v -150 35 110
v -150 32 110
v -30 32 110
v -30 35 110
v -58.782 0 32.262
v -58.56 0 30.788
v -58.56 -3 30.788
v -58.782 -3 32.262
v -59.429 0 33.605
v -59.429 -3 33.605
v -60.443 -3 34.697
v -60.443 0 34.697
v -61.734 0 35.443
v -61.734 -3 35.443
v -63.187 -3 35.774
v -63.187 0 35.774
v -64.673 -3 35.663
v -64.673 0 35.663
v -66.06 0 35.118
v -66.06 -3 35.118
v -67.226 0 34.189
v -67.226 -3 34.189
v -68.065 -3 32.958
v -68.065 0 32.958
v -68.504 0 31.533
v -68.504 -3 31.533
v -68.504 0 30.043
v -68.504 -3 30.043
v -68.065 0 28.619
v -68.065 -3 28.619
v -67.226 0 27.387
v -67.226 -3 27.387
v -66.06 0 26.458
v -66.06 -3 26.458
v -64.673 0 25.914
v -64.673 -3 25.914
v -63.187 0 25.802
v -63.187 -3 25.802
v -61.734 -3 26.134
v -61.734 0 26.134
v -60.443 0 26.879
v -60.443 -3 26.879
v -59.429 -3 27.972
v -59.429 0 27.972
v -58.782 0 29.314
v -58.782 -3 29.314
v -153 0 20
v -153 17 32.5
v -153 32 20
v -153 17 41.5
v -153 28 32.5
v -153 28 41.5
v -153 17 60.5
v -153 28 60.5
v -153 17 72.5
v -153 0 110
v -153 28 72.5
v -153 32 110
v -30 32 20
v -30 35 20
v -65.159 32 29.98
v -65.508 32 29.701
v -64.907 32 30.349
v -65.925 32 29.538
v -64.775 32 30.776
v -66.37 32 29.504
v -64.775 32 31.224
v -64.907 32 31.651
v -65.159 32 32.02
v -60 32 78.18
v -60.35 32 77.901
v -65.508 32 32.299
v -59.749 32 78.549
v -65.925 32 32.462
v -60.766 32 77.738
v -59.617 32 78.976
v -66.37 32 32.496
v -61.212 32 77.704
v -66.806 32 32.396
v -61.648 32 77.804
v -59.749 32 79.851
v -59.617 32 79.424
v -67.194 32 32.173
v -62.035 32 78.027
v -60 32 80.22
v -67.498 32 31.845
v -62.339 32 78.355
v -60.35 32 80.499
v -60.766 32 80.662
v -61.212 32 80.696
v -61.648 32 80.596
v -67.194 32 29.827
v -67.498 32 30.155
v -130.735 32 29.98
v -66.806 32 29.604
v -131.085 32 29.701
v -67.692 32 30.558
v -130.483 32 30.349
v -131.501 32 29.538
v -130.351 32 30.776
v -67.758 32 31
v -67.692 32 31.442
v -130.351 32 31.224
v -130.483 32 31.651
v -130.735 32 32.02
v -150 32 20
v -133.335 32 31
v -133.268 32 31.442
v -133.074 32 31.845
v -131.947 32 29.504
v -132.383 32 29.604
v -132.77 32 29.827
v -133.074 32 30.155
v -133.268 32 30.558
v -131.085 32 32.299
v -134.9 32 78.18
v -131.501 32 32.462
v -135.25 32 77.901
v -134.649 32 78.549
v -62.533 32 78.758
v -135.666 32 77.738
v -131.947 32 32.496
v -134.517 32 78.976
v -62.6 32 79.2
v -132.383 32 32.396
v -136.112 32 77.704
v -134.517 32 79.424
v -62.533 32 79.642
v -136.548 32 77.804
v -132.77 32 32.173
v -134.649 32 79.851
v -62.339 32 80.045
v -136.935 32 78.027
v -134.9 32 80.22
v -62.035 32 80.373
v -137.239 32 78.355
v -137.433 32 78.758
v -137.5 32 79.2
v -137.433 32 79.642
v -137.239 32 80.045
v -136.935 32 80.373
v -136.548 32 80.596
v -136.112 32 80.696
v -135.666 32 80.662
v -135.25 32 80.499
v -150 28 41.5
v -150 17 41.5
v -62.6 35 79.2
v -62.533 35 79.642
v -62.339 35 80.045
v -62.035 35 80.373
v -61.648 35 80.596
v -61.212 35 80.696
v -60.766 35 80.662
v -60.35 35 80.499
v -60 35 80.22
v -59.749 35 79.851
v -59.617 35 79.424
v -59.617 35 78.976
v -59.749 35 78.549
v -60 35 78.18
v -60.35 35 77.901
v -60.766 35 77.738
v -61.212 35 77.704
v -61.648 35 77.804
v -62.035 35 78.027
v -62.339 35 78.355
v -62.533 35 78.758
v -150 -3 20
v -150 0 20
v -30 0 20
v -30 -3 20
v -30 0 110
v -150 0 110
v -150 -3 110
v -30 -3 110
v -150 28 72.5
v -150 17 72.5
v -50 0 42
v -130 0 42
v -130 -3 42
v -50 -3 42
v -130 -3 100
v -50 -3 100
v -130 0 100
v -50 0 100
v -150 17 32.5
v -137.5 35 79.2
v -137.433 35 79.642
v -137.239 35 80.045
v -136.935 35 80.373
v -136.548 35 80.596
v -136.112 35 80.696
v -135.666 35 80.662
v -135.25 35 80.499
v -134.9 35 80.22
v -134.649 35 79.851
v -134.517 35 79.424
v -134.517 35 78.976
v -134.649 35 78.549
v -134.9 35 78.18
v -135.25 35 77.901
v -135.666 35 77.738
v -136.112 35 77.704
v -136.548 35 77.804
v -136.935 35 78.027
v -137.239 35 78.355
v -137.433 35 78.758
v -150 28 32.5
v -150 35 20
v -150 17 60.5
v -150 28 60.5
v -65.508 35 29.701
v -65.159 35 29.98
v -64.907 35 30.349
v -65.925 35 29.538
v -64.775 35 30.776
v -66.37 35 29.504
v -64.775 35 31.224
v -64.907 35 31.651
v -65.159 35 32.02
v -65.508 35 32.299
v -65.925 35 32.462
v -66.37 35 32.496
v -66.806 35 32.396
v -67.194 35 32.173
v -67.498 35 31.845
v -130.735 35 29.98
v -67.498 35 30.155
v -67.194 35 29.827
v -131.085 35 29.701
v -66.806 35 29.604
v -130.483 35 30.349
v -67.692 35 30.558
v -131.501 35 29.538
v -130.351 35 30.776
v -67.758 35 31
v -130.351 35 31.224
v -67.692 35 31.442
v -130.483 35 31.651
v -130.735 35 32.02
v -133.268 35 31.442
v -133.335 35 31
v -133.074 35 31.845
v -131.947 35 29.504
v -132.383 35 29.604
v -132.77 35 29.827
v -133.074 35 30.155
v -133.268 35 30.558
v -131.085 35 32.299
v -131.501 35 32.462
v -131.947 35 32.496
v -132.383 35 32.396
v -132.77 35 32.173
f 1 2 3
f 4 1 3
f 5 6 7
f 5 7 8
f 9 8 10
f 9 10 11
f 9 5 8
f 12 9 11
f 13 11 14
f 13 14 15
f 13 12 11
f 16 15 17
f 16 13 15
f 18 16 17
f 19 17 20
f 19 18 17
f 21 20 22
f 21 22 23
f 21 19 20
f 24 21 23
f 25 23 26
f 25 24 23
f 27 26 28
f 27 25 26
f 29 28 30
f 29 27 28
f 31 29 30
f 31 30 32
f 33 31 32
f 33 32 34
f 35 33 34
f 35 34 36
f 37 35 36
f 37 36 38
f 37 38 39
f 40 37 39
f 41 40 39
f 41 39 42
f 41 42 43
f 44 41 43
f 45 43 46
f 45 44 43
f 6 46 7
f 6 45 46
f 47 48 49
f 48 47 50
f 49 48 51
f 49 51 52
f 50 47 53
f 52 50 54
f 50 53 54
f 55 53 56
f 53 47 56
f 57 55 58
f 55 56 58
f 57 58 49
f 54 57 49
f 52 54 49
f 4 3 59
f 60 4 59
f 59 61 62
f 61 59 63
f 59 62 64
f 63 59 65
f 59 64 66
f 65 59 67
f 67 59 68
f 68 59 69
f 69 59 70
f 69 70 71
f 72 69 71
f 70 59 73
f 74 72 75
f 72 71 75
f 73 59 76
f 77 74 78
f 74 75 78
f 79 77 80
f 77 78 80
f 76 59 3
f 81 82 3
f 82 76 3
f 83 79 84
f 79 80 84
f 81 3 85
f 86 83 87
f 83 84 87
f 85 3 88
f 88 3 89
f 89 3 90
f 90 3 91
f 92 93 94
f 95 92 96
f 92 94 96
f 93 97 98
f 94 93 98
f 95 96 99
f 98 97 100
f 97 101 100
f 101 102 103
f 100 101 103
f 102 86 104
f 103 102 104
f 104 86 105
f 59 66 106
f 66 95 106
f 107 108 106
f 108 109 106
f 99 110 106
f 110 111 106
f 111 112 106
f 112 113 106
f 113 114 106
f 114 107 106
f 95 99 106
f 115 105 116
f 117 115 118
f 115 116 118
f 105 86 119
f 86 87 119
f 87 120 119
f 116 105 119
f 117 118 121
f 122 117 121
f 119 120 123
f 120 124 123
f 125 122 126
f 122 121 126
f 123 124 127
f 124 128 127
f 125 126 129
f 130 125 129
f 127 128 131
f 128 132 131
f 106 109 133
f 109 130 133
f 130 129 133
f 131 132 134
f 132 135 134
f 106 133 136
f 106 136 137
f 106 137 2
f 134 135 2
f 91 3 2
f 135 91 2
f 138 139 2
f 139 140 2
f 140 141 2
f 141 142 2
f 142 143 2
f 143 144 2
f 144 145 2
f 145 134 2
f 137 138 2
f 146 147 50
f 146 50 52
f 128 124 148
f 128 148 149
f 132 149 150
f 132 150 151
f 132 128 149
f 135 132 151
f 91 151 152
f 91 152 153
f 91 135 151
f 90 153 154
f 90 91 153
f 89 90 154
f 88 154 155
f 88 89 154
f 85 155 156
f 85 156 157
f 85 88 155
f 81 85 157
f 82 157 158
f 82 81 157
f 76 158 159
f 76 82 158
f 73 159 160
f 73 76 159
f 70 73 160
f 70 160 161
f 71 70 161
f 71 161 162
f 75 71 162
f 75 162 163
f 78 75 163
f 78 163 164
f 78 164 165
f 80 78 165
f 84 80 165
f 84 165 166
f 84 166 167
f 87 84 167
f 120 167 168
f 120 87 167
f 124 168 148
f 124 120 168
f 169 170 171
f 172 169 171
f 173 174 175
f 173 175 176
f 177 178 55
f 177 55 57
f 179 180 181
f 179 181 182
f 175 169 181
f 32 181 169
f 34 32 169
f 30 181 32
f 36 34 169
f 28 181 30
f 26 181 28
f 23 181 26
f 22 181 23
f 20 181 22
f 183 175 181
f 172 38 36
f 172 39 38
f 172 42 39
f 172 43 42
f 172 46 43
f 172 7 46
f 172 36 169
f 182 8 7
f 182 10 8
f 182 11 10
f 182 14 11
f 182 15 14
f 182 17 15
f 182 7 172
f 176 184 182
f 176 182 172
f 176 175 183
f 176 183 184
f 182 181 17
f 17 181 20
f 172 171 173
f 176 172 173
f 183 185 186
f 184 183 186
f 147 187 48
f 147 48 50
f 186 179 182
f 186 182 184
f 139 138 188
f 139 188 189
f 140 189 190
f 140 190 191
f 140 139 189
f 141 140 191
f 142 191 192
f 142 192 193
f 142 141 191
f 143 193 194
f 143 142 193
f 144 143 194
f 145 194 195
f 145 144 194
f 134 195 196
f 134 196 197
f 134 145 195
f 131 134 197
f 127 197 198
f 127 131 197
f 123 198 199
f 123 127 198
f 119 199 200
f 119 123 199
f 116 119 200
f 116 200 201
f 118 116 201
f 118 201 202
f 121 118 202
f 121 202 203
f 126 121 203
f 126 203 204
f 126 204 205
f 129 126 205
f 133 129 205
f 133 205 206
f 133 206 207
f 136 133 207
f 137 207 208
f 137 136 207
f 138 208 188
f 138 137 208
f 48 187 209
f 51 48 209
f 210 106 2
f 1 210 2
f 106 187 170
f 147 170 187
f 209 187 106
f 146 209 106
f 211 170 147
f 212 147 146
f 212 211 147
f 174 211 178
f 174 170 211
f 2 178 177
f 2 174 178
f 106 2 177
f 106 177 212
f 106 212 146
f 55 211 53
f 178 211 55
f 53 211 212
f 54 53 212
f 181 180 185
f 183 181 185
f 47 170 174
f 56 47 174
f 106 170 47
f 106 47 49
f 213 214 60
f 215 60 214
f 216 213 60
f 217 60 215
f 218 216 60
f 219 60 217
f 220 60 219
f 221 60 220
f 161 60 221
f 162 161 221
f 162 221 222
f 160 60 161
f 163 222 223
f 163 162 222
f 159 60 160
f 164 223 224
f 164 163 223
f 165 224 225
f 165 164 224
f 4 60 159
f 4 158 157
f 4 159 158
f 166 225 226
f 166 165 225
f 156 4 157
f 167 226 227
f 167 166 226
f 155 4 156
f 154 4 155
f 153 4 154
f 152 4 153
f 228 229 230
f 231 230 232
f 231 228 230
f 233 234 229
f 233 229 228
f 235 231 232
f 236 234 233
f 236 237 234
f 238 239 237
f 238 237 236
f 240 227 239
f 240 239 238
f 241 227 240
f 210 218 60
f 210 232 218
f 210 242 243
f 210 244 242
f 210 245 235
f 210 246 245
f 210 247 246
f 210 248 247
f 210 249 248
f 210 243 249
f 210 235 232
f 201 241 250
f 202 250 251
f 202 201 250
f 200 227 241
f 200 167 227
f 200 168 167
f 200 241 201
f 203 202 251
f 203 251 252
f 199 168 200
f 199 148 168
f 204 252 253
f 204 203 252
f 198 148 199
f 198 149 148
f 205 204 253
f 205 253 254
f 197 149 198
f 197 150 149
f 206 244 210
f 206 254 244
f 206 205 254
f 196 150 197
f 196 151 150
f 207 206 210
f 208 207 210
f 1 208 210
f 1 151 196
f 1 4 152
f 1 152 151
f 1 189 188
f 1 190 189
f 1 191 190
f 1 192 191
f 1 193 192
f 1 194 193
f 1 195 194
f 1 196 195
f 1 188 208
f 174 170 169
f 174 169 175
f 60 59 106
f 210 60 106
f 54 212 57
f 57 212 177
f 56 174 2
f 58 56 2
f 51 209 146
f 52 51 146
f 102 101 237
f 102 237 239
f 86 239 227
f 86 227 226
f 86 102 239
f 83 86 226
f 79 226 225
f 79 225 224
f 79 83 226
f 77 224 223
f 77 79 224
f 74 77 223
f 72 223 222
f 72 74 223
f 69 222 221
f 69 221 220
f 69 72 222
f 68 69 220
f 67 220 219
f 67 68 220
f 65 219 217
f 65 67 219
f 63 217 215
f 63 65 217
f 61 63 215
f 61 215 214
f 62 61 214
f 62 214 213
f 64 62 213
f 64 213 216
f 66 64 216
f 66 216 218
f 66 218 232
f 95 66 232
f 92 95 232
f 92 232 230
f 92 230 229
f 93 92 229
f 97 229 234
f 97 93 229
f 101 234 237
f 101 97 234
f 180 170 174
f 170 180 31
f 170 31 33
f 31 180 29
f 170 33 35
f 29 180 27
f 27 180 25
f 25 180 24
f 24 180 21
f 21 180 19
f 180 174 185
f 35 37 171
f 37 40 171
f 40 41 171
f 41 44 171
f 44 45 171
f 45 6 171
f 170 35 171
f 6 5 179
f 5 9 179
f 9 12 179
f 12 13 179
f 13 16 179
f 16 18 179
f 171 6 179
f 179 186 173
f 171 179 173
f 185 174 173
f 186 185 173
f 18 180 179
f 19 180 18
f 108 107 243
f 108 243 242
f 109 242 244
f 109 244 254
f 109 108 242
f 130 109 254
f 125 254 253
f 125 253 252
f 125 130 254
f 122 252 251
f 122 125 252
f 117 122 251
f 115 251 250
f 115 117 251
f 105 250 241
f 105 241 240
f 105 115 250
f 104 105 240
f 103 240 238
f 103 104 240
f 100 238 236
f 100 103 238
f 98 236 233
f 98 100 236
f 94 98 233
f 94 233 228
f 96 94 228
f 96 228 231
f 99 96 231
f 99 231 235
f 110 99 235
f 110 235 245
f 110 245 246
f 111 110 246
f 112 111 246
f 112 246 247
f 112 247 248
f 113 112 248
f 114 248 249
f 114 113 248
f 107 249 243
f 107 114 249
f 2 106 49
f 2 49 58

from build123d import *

# Parameters (mm, degrees)
F2_W     = 32
F2_H     = 90
F2_W_2   = 11
F2_H_2   = 9
F2_H_3   = 12
F3_DEPTH = 3
F0_W     = 120
F0_H     = 90
F0_R     = 5
F0_W_2   = 80
F0_H_2   = 58
F4_DEPTH = 3
F5_W     = 101.6
F5_H     = 53.3
F5_R     = 1.5
F6_DEPTH = 3


with BuildPart() as f3:
    # F2 (on offset) → F3 (new body)
    with BuildSketch(Plane.YZ.offset(-150)):
        with Locations((16, 65)):
            Rectangle(F2_W, F2_H)
        with Locations((22.5, 37)):
            Rectangle(F2_W_2, F2_H_2, mode=Mode.SUBTRACT)
        with Locations((22.5, 66.5)):
            Rectangle(F2_W_2, F2_H_3, mode=Mode.SUBTRACT)
    extrude(amount=-F3_DEPTH)


with BuildPart() as f4:
    # F0 (on Front) → F4 (new body)
    with BuildSketch(Plane.XZ):
        with Locations((-90, 65)):
            Rectangle(F0_W, F0_H)
        with Locations((-63.560285, 30.788196)):
            Circle(F0_R, mode=Mode.SUBTRACT)
        with Locations((-90, 71)):
            Rectangle(F0_W_2, F0_H_2, mode=Mode.SUBTRACT)
    extrude(amount=F4_DEPTH)


with BuildPart() as f6:
    # F5 (on face) → F6 (new body)
    with BuildSketch(Plane(origin=(0, 32, 0), x_dir=(-1, 0, 0), z_dir=(0, 1, 0))):
        Polygon((150, 110), (30, 110), (30, 20), (150, 20), (150, 28.5), (48.4, 28.5), (48.4, 81.8), (150, 81.8), align=None)
        with Locations((99.2, 55.15)):
            Rectangle(F5_W, F5_H)
        with Locations((66.258339, 31)):
            Circle(F5_R, mode=Mode.SUBTRACT)
        with Locations((131.834745, 31)):
            Circle(F5_R, mode=Mode.SUBTRACT)
        with Locations((61.1, 79.2)):
            Circle(F5_R, mode=Mode.SUBTRACT)
        with Locations((136, 79.2)):
            Circle(F5_R, mode=Mode.SUBTRACT)
    extrude(amount=F6_DEPTH)


solid = Compound([f3.part, f4.part, f6.part])
